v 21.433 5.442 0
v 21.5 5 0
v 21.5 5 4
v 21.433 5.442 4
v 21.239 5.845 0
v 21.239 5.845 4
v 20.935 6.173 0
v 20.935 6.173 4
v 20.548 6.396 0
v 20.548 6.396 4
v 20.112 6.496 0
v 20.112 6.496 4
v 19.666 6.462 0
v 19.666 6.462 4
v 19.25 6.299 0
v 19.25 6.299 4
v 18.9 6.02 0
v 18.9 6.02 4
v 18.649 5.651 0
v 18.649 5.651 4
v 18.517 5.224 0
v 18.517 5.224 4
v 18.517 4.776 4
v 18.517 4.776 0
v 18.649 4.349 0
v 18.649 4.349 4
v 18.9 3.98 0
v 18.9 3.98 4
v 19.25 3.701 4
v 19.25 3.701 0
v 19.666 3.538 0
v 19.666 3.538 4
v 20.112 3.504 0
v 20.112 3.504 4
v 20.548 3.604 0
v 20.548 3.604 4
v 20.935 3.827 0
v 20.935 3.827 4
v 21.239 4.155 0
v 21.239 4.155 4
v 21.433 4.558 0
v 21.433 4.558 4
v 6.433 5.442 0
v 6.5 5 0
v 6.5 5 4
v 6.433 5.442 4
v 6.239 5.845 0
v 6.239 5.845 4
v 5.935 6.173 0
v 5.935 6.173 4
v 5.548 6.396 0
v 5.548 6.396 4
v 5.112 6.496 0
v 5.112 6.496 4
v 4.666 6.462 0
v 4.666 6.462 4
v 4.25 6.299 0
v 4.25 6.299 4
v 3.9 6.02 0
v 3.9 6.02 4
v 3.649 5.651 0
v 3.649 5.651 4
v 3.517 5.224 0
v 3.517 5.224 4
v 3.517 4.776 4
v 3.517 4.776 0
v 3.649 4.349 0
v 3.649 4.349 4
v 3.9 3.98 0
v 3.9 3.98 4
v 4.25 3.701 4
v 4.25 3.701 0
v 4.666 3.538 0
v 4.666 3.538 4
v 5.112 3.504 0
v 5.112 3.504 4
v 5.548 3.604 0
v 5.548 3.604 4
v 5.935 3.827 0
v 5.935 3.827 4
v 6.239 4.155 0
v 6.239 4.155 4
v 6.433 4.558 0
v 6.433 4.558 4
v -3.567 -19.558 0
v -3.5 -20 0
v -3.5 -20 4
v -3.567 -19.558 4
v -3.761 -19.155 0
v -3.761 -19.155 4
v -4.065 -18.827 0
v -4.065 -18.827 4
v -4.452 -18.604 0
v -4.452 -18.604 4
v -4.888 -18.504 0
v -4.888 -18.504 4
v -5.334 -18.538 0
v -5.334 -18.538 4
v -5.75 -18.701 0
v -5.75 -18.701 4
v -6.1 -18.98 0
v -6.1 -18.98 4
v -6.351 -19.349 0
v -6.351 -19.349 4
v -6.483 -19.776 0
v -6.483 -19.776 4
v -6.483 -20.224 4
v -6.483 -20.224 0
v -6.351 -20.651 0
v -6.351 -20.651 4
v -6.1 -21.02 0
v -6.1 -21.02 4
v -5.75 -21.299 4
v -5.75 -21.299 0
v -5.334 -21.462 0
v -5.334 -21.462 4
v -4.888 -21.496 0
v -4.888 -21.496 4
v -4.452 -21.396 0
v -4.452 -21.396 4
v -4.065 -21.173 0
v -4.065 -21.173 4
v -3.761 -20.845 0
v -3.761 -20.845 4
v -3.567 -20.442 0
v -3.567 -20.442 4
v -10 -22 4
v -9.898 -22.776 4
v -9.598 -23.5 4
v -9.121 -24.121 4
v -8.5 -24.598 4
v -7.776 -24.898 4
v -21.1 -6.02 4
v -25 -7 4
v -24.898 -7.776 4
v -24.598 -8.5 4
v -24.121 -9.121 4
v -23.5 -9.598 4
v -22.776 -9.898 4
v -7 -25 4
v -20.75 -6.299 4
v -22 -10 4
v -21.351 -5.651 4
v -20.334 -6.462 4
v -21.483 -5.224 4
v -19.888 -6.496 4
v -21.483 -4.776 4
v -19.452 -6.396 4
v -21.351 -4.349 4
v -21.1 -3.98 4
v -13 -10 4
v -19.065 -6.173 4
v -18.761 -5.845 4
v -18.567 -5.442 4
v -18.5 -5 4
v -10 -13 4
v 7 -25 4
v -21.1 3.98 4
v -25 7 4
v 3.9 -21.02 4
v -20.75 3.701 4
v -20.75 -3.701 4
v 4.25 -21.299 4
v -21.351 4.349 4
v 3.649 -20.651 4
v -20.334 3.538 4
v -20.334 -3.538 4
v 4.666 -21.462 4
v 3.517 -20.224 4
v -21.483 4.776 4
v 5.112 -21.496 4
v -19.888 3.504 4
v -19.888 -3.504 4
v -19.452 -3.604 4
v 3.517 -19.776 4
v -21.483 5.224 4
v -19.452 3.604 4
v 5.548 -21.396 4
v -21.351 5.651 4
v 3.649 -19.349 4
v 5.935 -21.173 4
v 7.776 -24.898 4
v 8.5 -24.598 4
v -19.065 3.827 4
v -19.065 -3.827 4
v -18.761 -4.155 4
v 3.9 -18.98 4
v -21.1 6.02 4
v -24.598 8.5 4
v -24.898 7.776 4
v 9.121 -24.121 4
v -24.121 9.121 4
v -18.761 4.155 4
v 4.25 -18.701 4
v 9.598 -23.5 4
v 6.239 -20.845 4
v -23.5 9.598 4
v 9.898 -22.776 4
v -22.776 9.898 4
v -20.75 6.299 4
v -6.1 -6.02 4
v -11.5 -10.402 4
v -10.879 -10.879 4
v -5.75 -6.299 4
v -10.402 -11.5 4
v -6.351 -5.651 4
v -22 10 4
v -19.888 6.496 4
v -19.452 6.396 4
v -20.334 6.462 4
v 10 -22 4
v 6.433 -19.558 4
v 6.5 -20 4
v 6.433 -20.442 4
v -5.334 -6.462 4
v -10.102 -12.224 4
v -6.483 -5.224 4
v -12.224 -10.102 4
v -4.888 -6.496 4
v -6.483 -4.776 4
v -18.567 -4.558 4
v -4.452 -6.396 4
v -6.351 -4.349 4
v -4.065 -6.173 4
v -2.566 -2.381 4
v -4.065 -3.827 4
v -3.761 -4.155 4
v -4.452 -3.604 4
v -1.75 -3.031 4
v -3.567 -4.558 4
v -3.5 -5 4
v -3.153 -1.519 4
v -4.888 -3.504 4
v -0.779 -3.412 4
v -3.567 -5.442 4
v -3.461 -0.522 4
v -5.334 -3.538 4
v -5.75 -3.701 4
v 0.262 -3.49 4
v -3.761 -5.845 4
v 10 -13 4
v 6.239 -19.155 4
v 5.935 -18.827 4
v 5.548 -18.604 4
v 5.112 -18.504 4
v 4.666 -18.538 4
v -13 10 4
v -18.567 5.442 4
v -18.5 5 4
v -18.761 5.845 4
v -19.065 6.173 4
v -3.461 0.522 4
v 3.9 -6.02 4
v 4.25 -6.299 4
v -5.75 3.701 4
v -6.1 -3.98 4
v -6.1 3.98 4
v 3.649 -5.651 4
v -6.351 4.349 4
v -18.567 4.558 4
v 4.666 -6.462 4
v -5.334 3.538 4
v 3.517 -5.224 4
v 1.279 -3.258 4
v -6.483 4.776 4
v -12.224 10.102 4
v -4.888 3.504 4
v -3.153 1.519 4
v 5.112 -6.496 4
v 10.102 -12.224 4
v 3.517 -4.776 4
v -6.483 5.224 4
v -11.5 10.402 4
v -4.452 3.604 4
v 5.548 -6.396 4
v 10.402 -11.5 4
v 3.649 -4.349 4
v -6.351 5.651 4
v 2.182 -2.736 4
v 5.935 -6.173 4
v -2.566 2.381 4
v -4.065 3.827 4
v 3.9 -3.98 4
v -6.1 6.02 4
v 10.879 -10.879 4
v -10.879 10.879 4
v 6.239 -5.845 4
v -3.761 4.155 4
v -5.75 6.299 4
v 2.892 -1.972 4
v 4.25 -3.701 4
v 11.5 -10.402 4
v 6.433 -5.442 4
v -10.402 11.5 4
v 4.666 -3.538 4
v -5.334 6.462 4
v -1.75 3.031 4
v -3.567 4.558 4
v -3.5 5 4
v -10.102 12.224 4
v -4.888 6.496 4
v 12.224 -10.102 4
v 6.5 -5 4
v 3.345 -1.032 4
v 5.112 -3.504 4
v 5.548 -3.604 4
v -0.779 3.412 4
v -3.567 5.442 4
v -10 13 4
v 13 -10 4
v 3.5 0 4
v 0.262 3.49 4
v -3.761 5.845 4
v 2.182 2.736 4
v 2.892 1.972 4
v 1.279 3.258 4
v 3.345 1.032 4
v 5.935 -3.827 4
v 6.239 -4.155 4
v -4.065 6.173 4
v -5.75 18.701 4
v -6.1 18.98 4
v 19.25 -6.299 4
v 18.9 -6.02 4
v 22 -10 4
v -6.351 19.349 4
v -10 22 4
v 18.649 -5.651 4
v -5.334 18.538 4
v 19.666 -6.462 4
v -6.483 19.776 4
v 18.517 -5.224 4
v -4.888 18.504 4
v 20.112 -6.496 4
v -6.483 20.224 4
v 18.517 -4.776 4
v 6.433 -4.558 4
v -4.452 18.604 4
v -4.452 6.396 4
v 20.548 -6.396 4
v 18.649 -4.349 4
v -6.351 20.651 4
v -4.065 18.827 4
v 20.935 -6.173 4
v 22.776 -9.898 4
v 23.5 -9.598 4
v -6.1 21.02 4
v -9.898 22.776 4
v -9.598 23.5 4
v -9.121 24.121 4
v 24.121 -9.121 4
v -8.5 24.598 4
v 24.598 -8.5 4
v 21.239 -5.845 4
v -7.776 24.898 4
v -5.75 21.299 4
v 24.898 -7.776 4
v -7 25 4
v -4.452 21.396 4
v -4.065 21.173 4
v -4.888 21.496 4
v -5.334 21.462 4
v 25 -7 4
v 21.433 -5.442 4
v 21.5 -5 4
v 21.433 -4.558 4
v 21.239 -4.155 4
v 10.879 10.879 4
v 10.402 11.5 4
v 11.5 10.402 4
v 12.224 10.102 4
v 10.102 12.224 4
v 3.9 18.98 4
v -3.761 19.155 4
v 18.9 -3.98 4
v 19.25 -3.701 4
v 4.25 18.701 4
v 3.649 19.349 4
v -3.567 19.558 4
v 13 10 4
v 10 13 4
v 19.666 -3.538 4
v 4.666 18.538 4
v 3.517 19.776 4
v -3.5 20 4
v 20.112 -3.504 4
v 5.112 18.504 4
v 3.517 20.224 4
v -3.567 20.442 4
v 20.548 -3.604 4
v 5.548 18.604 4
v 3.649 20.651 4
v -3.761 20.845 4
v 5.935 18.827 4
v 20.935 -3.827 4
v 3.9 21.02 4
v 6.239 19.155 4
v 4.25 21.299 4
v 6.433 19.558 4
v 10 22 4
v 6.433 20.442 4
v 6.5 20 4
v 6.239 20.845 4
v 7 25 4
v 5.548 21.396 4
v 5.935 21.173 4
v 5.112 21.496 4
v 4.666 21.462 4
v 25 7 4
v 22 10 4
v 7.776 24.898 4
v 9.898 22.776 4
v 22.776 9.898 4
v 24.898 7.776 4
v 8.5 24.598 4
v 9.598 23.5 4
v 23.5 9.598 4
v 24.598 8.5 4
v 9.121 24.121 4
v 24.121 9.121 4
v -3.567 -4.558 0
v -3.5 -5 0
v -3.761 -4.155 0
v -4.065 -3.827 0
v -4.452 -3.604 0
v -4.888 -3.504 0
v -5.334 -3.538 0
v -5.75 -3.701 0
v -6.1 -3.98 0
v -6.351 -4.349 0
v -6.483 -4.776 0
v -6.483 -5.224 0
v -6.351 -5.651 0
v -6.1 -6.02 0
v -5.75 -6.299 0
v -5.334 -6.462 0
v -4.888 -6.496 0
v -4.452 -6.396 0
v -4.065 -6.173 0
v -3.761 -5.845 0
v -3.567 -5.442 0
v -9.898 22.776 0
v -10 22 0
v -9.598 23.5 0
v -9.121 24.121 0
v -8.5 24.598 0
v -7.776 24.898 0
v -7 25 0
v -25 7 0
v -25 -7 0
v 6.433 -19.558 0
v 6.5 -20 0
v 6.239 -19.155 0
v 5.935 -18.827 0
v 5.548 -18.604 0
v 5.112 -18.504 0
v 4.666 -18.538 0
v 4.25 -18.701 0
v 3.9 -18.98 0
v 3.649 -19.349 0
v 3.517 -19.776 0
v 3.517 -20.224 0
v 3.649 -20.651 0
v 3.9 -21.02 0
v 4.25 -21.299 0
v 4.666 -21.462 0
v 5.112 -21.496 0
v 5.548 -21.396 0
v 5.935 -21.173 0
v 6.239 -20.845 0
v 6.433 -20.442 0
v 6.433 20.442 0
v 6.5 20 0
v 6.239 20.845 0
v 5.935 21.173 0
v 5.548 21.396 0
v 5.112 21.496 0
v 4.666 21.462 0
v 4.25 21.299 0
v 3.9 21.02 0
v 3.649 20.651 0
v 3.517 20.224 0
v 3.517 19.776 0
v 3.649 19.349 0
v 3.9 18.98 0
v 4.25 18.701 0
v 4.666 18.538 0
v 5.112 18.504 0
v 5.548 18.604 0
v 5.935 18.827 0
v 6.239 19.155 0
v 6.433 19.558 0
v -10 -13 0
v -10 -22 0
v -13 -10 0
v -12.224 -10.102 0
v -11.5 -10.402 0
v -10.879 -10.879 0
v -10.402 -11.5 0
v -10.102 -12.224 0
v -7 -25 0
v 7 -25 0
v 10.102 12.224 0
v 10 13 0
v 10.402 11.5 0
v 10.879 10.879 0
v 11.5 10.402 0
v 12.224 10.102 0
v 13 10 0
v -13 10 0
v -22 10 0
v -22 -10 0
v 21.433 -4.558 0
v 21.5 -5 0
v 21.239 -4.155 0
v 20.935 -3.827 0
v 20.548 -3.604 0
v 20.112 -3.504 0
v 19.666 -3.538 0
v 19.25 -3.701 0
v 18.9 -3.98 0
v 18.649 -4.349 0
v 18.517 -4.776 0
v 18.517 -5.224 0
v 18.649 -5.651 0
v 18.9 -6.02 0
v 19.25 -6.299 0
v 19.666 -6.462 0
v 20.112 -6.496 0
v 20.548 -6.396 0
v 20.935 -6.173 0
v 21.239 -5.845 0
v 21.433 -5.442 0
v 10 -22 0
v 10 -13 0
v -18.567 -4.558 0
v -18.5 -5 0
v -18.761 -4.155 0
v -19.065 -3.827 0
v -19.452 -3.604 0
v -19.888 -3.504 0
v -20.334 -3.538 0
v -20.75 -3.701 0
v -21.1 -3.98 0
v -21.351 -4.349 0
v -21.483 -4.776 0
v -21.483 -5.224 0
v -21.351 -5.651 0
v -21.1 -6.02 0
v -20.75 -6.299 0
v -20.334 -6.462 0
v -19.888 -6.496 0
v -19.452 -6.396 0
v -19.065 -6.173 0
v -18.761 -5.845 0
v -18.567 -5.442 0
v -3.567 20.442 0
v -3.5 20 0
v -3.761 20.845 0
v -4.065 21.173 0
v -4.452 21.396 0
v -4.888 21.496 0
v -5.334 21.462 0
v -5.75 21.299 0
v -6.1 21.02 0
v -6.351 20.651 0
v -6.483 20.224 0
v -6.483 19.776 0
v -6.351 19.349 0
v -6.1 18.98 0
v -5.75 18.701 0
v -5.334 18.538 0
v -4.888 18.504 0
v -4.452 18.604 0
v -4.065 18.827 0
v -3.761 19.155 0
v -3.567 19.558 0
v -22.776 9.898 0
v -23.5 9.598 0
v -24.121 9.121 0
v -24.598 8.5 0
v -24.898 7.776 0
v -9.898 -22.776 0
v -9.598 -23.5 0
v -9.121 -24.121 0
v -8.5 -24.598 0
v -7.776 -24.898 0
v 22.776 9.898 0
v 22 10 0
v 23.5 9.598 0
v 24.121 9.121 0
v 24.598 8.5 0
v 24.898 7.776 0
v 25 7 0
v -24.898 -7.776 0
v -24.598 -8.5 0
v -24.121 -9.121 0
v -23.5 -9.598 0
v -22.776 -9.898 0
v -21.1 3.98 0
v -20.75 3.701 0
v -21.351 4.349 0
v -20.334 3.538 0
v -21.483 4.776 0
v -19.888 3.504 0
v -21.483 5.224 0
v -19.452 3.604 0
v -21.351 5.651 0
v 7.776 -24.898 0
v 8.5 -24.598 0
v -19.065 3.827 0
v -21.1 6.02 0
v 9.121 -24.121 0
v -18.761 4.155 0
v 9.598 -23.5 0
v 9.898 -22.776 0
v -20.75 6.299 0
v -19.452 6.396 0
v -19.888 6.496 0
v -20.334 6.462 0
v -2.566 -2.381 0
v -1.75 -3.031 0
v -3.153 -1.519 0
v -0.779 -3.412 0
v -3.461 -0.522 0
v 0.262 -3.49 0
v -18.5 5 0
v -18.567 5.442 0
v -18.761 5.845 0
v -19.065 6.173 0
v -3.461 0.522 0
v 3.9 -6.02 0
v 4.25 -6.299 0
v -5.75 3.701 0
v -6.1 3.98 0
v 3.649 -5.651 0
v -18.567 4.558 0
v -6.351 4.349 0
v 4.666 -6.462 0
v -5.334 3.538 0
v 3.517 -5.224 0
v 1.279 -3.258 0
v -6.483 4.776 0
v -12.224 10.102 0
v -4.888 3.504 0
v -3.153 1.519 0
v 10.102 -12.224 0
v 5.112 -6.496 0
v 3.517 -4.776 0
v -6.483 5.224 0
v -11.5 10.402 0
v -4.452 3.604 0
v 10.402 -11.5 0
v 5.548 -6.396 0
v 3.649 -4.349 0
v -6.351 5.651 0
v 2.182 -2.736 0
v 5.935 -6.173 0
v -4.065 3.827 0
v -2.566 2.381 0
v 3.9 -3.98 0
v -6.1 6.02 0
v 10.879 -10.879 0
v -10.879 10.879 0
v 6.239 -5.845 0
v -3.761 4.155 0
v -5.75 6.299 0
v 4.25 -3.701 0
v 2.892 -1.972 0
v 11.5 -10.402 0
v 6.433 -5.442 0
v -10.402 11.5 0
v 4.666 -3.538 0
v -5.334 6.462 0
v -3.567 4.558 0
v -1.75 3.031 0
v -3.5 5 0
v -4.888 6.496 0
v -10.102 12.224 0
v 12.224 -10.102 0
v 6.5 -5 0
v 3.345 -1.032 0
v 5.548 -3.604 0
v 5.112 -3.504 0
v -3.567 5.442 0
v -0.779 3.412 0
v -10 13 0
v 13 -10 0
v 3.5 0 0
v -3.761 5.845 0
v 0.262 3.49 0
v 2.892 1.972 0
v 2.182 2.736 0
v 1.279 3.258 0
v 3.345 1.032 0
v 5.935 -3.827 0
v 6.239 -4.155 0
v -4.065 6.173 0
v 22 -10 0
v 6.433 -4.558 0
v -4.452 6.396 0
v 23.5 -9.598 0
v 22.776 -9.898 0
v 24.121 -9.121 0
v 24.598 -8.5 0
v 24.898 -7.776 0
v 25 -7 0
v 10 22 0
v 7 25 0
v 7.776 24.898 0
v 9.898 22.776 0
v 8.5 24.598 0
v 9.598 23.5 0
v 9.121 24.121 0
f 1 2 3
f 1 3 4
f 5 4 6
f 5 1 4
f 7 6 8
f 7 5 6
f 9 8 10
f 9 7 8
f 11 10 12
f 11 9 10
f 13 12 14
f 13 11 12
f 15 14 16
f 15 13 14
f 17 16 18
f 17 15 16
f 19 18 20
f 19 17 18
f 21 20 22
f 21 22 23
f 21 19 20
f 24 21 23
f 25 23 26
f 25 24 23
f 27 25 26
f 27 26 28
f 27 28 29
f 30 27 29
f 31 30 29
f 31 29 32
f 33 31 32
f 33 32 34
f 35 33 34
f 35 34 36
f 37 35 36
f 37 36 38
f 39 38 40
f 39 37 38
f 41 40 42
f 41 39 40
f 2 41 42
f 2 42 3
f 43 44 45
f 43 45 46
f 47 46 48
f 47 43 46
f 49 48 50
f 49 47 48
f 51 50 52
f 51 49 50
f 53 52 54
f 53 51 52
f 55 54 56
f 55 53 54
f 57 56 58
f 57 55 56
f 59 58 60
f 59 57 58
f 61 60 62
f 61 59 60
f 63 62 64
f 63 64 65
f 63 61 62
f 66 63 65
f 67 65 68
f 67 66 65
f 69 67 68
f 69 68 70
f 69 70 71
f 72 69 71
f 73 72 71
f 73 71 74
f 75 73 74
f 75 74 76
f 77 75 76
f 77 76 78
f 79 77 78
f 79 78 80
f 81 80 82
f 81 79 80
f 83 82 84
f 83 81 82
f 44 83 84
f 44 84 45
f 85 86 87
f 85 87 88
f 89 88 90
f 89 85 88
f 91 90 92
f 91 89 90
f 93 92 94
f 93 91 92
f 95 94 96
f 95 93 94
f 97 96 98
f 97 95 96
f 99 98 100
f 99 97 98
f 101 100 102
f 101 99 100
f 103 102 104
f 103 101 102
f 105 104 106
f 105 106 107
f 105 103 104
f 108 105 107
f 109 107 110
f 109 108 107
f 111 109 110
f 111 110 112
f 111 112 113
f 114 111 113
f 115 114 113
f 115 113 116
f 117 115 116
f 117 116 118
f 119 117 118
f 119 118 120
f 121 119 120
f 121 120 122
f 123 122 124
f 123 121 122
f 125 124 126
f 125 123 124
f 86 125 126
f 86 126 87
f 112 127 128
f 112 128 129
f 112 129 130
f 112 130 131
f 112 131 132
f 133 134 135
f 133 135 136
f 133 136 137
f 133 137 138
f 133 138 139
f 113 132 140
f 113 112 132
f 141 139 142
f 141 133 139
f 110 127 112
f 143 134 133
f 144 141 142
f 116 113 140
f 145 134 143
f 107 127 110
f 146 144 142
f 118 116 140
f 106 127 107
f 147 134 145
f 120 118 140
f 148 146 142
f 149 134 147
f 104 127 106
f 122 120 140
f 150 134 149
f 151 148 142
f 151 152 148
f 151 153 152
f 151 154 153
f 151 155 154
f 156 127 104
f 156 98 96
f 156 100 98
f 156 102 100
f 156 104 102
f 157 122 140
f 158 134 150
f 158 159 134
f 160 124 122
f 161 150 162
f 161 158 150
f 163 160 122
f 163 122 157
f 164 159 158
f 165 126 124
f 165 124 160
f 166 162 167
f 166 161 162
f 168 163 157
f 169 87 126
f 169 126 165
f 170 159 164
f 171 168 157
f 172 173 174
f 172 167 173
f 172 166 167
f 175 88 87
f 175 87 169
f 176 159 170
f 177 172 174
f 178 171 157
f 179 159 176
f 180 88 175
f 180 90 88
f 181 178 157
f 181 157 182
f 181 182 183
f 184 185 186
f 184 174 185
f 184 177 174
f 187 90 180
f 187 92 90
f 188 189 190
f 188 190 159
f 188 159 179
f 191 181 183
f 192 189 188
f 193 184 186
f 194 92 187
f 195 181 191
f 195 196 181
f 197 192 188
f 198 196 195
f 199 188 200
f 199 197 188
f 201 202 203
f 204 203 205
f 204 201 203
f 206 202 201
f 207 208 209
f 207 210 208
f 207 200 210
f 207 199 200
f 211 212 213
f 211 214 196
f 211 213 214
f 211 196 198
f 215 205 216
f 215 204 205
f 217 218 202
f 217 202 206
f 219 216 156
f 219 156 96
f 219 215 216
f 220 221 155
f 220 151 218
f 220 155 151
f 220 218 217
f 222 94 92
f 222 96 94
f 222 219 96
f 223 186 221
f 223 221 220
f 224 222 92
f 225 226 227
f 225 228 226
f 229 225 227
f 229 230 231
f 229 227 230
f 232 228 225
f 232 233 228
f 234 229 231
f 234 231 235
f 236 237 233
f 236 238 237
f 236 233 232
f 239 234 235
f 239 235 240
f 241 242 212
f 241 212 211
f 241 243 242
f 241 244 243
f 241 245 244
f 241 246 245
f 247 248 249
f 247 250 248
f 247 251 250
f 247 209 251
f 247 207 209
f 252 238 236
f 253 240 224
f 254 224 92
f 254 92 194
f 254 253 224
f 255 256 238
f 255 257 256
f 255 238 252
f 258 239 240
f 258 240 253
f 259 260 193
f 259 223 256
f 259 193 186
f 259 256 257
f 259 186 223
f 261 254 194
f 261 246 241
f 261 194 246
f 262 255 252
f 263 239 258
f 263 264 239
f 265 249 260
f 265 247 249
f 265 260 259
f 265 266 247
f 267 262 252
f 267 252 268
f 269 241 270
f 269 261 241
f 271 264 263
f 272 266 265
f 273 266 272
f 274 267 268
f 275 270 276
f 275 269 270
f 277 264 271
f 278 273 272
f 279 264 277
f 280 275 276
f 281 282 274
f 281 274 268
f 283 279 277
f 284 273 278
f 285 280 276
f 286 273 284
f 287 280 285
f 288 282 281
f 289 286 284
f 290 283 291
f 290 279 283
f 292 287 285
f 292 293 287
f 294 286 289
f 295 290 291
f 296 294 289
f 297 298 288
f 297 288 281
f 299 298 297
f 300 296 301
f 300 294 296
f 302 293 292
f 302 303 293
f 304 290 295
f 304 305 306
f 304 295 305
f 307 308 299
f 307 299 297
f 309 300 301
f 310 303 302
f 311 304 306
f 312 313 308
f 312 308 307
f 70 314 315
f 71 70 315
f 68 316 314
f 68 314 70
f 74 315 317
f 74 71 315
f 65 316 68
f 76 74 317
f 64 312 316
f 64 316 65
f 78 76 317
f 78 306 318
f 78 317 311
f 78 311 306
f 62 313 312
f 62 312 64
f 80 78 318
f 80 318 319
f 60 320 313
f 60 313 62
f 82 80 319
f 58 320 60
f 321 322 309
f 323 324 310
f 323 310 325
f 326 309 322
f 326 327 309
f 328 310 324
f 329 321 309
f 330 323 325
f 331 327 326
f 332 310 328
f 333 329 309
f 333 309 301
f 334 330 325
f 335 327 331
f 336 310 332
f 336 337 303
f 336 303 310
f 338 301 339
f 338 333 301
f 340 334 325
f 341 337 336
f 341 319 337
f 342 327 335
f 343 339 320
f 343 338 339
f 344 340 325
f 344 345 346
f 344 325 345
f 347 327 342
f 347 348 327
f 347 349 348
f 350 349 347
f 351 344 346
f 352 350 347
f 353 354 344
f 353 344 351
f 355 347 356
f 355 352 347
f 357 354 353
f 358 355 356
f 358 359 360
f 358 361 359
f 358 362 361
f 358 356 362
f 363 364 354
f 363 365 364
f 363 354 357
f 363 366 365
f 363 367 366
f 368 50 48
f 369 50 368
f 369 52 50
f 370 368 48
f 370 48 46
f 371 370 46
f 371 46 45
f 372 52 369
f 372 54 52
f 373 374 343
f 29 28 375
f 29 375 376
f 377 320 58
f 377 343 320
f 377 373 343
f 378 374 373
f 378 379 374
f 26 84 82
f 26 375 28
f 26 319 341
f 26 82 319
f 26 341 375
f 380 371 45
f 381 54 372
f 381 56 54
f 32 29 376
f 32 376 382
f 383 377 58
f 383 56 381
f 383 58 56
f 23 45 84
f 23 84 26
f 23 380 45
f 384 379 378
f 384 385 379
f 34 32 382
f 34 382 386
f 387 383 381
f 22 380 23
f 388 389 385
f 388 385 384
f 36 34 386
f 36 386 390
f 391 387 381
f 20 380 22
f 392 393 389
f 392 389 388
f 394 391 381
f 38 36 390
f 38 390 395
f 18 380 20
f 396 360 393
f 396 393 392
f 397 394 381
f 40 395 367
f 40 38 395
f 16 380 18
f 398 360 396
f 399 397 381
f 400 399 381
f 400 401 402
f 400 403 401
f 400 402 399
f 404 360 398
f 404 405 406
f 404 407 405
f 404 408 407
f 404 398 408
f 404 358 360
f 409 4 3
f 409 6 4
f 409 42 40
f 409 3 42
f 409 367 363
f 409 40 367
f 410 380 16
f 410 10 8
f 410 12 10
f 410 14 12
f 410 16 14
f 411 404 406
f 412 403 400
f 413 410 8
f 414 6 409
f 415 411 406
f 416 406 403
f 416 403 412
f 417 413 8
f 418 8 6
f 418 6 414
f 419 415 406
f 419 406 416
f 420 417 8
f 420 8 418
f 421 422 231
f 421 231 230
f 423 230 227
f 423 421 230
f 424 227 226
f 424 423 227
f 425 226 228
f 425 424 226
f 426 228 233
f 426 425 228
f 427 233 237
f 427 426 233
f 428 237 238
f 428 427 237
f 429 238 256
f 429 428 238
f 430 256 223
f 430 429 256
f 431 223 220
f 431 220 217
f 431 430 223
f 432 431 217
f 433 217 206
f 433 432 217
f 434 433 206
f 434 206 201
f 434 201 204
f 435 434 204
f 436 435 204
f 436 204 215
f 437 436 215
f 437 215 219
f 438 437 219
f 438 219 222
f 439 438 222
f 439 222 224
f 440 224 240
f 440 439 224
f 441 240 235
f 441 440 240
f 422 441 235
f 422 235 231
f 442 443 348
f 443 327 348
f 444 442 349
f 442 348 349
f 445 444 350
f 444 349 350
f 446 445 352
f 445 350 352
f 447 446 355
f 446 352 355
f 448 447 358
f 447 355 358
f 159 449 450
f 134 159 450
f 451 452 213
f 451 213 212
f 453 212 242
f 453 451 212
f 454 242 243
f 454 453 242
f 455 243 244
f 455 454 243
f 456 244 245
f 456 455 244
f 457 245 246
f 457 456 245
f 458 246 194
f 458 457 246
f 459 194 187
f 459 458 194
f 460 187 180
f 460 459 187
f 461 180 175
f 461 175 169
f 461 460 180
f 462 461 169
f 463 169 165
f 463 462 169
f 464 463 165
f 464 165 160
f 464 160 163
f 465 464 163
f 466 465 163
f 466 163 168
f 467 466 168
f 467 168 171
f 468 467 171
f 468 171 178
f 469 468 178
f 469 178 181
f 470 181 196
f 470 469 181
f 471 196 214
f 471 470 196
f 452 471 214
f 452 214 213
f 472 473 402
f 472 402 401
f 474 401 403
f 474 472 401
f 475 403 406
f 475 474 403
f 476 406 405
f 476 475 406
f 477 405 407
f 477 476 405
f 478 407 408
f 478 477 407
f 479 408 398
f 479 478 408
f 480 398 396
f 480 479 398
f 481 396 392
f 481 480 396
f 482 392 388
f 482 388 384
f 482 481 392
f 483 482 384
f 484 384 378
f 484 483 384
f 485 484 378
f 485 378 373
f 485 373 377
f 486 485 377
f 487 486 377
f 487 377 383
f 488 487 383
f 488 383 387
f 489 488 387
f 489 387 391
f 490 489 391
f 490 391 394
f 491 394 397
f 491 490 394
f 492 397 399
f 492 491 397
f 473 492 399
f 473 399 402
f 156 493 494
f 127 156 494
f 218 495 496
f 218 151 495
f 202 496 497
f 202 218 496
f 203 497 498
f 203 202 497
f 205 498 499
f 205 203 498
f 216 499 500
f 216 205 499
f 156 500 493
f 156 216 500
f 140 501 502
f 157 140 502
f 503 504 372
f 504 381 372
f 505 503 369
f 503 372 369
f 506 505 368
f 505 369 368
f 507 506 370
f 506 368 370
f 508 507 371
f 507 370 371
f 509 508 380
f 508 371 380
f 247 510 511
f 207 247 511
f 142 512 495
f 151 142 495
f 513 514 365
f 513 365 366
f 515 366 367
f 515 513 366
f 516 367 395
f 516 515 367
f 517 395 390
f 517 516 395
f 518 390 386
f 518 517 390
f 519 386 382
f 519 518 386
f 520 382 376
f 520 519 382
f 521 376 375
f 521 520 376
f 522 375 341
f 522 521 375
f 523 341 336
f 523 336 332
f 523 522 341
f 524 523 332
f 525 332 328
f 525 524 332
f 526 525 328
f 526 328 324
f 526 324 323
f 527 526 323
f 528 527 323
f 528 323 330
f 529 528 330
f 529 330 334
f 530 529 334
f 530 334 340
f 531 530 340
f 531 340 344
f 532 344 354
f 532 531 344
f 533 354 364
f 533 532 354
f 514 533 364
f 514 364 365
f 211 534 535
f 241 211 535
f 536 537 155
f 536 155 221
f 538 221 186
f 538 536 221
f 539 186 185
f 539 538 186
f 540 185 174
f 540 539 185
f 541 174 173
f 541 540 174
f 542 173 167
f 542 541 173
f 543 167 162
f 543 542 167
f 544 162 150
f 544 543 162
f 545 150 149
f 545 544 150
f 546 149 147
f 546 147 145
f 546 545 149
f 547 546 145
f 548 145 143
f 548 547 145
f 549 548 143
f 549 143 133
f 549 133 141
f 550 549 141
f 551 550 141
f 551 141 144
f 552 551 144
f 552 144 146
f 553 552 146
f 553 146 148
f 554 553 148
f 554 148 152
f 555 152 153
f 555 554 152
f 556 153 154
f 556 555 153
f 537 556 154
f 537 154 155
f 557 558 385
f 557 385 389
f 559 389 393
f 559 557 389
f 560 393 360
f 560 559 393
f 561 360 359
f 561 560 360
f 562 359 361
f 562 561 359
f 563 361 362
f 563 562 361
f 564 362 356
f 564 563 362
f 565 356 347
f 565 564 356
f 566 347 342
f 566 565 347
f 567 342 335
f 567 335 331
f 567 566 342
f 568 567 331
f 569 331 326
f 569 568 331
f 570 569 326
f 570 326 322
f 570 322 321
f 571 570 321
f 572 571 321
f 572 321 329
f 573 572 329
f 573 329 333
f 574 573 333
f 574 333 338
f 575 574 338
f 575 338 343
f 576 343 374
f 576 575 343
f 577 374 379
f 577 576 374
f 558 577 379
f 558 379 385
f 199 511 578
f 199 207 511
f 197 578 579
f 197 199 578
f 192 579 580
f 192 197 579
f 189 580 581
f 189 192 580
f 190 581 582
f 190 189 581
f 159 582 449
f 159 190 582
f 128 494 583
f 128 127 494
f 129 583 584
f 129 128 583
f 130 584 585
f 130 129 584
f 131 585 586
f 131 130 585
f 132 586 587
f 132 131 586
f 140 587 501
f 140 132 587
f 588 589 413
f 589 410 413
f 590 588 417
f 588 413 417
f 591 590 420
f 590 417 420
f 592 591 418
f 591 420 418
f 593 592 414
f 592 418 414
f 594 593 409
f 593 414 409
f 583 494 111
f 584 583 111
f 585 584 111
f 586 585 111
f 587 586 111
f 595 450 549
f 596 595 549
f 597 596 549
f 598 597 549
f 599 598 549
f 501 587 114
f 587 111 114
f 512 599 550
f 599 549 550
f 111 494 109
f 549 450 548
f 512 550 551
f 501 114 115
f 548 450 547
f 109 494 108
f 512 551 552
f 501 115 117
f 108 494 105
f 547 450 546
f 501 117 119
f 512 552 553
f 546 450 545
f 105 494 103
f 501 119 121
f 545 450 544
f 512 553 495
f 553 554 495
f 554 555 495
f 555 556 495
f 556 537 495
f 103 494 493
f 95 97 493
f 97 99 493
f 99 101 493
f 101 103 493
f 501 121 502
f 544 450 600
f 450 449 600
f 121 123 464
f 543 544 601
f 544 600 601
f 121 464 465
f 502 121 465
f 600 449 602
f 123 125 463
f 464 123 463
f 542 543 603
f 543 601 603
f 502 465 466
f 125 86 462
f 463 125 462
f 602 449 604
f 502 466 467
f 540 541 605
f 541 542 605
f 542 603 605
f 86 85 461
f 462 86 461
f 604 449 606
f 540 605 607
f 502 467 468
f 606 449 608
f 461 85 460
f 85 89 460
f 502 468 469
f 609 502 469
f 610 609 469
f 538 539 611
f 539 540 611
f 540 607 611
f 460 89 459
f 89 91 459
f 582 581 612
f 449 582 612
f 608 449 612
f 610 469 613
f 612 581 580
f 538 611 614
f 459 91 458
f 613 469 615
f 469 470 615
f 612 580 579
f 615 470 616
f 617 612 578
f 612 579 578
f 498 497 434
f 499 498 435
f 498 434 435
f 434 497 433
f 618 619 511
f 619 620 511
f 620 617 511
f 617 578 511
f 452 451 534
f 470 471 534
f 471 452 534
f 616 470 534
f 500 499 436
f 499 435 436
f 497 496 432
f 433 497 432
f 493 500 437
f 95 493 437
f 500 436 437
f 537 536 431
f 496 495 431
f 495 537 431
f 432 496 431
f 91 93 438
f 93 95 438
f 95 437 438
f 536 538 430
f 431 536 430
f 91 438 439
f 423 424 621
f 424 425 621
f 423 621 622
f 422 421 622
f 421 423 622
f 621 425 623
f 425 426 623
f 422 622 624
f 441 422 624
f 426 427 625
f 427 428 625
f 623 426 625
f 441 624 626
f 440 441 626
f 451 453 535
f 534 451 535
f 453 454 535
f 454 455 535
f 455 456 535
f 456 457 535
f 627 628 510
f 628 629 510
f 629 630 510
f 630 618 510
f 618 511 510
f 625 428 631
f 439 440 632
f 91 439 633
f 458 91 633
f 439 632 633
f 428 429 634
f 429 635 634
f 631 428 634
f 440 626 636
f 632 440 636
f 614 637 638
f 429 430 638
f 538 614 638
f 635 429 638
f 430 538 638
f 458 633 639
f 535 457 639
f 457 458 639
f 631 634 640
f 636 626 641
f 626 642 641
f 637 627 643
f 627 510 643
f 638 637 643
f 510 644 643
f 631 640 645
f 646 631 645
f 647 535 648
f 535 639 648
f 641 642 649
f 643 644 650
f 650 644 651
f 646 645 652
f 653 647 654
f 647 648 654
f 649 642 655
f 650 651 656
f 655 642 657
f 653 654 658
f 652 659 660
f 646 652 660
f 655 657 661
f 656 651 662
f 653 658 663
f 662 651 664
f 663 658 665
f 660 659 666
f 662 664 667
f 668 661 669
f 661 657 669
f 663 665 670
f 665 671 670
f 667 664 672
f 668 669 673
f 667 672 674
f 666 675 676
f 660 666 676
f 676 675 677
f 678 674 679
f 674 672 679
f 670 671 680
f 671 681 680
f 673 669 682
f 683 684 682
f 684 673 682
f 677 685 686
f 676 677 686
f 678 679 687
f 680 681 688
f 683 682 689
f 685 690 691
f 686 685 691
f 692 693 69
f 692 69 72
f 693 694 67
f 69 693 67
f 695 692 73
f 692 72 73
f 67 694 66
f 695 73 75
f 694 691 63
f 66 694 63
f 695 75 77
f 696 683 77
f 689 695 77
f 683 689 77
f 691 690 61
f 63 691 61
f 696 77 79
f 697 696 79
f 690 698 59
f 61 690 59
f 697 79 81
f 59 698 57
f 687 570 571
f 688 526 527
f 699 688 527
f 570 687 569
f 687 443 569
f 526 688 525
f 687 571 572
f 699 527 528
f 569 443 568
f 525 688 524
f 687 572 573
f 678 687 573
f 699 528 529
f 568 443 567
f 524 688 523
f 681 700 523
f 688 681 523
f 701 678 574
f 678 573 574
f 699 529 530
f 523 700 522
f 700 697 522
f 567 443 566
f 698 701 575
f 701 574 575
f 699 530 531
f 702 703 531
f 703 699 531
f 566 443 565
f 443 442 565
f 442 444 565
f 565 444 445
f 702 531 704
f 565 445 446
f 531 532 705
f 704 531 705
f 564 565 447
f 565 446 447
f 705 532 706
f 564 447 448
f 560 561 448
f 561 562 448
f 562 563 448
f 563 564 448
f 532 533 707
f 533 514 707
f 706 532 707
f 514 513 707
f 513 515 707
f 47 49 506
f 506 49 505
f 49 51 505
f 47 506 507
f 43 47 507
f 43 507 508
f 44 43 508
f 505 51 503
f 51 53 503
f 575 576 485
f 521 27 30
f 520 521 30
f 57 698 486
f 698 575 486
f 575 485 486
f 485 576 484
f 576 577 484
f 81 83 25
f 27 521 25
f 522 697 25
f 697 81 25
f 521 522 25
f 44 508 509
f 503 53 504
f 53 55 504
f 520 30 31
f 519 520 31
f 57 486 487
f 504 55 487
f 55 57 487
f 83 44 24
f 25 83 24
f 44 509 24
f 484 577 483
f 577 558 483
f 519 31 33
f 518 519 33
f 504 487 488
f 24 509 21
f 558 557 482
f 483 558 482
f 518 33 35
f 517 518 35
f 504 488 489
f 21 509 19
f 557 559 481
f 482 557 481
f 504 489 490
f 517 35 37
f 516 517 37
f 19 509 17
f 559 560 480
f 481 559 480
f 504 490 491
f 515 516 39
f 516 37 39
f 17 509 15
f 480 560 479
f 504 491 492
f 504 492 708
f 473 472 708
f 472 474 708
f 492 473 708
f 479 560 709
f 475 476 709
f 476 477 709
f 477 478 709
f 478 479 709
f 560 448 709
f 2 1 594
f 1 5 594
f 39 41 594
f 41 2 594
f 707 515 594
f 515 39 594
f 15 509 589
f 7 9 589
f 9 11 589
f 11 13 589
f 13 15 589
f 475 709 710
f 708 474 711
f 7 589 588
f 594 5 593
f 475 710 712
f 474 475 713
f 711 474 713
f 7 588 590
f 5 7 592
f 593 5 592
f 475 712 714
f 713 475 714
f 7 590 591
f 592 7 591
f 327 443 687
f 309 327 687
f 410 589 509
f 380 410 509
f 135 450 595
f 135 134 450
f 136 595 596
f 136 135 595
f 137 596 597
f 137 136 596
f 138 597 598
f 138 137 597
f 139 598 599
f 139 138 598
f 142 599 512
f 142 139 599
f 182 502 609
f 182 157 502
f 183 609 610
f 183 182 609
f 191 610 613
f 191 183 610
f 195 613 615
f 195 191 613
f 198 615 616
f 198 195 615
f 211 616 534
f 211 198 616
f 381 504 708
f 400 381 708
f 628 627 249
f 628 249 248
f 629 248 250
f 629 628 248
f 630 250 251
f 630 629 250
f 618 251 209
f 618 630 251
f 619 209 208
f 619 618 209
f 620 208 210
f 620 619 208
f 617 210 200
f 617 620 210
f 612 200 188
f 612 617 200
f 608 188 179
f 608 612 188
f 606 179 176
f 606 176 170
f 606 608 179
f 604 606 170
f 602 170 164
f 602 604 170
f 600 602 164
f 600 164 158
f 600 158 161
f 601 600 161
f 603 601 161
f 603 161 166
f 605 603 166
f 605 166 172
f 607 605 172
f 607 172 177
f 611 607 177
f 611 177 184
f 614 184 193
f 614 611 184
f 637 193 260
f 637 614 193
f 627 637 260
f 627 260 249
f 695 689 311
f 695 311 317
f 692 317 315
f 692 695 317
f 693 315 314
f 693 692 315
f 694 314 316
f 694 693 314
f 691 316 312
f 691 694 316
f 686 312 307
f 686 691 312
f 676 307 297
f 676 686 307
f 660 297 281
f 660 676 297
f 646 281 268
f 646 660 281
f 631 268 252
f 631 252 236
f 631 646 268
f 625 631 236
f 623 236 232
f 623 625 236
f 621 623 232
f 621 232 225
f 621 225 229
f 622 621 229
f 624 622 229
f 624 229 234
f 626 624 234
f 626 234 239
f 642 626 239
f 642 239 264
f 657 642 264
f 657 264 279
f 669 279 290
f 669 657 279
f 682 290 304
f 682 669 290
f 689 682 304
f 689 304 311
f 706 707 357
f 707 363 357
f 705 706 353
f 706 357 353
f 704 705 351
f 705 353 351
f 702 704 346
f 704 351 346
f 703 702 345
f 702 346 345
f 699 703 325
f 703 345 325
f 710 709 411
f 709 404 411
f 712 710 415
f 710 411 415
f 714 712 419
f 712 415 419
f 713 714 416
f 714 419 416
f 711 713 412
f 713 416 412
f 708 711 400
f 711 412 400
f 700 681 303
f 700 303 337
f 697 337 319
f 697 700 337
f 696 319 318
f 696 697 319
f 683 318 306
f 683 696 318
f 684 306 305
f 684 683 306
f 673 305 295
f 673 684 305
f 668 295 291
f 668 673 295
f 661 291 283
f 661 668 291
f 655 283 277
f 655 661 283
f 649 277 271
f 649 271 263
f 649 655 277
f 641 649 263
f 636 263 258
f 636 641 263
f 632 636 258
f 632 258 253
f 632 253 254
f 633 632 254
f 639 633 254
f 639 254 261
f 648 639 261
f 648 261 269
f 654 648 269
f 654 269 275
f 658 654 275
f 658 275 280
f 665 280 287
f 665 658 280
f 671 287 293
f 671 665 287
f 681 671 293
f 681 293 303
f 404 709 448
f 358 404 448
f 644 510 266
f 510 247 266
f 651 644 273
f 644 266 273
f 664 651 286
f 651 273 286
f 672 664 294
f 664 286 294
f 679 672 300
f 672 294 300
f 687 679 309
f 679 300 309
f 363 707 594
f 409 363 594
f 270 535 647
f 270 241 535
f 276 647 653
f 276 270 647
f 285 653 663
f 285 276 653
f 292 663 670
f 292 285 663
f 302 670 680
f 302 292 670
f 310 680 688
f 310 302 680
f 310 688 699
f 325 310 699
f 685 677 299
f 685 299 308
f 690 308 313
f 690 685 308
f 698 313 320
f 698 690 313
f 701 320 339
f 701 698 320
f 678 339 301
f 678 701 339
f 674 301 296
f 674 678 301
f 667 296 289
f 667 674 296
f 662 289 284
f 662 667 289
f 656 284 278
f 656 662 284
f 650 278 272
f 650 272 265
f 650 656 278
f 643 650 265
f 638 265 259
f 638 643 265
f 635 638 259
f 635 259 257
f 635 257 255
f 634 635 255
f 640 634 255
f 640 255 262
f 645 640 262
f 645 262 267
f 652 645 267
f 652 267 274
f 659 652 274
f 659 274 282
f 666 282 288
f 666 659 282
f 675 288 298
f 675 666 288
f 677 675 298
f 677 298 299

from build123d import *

# Parameters (mm, degrees)
SKETCH_1_R      = 1.5
SKETCH_1_R_2    = 3.5
EXTRUDE_1_DEPTH = 4
FILLET_1_R      = 3


with BuildPart() as part:
    # 草图1 → 凸台-拉伸1 (new body)
    with BuildSketch(Plane.XY):
        Polygon((-10, 10), (-25, 10), (-25, -10), (-10, -10), (-10, -25), (10, -25), (10, -10), (25, -10), (25, 10), (10, 10), (10, 25), (-10, 25), align=None)
        with Locations((-20, -5)):
            Circle(SKETCH_1_R, mode=Mode.SUBTRACT)
        with Locations((-20, 5)):
            Circle(SKETCH_1_R, mode=Mode.SUBTRACT)
        with Locations((5, 5)):
            Circle(SKETCH_1_R, mode=Mode.SUBTRACT)
        with Locations((-5, -5)):
            Circle(SKETCH_1_R, mode=Mode.SUBTRACT)
        with Locations((5, -5)):
            Circle(SKETCH_1_R, mode=Mode.SUBTRACT)
        Circle(SKETCH_1_R_2, mode=Mode.SUBTRACT)
        with Locations((-5, 5)):
            Circle(SKETCH_1_R, mode=Mode.SUBTRACT)
        with Locations((5, 20)):
            Circle(SKETCH_1_R, mode=Mode.SUBTRACT)
        with Locations((-5, 20)):
            Circle(SKETCH_1_R, mode=Mode.SUBTRACT)
        with Locations((20, 5)):
            Circle(SKETCH_1_R, mode=Mode.SUBTRACT)
        with Locations((20, -5)):
            Circle(SKETCH_1_R, mode=Mode.SUBTRACT)
        with Locations((5, -20)):
            Circle(SKETCH_1_R, mode=Mode.SUBTRACT)
        with Locations((-5, -20)):
            Circle(SKETCH_1_R, mode=Mode.SUBTRACT)
    extrude(amount=EXTRUDE_1_DEPTH)

    # 圆角1
    fillet_1_edges = [part.edges().sort_by_distance(p)[0] for p in [
        (25, 10, 2),
        (25, -10, 2),
        (10, -10, 2),
        (10, -25, 2),
        (-10, -25, 2),
        (-10, -10, 2),
        (-25, -10, 2),
        (-25, 10, 2),
        (-10, 10, 2),
        (-10, 25, 2),
        (10, 25, 2),
        (10, 10, 2),
    ]]
    fillet(fillet_1_edges, radius=FILLET_1_R)


solid = part.part
